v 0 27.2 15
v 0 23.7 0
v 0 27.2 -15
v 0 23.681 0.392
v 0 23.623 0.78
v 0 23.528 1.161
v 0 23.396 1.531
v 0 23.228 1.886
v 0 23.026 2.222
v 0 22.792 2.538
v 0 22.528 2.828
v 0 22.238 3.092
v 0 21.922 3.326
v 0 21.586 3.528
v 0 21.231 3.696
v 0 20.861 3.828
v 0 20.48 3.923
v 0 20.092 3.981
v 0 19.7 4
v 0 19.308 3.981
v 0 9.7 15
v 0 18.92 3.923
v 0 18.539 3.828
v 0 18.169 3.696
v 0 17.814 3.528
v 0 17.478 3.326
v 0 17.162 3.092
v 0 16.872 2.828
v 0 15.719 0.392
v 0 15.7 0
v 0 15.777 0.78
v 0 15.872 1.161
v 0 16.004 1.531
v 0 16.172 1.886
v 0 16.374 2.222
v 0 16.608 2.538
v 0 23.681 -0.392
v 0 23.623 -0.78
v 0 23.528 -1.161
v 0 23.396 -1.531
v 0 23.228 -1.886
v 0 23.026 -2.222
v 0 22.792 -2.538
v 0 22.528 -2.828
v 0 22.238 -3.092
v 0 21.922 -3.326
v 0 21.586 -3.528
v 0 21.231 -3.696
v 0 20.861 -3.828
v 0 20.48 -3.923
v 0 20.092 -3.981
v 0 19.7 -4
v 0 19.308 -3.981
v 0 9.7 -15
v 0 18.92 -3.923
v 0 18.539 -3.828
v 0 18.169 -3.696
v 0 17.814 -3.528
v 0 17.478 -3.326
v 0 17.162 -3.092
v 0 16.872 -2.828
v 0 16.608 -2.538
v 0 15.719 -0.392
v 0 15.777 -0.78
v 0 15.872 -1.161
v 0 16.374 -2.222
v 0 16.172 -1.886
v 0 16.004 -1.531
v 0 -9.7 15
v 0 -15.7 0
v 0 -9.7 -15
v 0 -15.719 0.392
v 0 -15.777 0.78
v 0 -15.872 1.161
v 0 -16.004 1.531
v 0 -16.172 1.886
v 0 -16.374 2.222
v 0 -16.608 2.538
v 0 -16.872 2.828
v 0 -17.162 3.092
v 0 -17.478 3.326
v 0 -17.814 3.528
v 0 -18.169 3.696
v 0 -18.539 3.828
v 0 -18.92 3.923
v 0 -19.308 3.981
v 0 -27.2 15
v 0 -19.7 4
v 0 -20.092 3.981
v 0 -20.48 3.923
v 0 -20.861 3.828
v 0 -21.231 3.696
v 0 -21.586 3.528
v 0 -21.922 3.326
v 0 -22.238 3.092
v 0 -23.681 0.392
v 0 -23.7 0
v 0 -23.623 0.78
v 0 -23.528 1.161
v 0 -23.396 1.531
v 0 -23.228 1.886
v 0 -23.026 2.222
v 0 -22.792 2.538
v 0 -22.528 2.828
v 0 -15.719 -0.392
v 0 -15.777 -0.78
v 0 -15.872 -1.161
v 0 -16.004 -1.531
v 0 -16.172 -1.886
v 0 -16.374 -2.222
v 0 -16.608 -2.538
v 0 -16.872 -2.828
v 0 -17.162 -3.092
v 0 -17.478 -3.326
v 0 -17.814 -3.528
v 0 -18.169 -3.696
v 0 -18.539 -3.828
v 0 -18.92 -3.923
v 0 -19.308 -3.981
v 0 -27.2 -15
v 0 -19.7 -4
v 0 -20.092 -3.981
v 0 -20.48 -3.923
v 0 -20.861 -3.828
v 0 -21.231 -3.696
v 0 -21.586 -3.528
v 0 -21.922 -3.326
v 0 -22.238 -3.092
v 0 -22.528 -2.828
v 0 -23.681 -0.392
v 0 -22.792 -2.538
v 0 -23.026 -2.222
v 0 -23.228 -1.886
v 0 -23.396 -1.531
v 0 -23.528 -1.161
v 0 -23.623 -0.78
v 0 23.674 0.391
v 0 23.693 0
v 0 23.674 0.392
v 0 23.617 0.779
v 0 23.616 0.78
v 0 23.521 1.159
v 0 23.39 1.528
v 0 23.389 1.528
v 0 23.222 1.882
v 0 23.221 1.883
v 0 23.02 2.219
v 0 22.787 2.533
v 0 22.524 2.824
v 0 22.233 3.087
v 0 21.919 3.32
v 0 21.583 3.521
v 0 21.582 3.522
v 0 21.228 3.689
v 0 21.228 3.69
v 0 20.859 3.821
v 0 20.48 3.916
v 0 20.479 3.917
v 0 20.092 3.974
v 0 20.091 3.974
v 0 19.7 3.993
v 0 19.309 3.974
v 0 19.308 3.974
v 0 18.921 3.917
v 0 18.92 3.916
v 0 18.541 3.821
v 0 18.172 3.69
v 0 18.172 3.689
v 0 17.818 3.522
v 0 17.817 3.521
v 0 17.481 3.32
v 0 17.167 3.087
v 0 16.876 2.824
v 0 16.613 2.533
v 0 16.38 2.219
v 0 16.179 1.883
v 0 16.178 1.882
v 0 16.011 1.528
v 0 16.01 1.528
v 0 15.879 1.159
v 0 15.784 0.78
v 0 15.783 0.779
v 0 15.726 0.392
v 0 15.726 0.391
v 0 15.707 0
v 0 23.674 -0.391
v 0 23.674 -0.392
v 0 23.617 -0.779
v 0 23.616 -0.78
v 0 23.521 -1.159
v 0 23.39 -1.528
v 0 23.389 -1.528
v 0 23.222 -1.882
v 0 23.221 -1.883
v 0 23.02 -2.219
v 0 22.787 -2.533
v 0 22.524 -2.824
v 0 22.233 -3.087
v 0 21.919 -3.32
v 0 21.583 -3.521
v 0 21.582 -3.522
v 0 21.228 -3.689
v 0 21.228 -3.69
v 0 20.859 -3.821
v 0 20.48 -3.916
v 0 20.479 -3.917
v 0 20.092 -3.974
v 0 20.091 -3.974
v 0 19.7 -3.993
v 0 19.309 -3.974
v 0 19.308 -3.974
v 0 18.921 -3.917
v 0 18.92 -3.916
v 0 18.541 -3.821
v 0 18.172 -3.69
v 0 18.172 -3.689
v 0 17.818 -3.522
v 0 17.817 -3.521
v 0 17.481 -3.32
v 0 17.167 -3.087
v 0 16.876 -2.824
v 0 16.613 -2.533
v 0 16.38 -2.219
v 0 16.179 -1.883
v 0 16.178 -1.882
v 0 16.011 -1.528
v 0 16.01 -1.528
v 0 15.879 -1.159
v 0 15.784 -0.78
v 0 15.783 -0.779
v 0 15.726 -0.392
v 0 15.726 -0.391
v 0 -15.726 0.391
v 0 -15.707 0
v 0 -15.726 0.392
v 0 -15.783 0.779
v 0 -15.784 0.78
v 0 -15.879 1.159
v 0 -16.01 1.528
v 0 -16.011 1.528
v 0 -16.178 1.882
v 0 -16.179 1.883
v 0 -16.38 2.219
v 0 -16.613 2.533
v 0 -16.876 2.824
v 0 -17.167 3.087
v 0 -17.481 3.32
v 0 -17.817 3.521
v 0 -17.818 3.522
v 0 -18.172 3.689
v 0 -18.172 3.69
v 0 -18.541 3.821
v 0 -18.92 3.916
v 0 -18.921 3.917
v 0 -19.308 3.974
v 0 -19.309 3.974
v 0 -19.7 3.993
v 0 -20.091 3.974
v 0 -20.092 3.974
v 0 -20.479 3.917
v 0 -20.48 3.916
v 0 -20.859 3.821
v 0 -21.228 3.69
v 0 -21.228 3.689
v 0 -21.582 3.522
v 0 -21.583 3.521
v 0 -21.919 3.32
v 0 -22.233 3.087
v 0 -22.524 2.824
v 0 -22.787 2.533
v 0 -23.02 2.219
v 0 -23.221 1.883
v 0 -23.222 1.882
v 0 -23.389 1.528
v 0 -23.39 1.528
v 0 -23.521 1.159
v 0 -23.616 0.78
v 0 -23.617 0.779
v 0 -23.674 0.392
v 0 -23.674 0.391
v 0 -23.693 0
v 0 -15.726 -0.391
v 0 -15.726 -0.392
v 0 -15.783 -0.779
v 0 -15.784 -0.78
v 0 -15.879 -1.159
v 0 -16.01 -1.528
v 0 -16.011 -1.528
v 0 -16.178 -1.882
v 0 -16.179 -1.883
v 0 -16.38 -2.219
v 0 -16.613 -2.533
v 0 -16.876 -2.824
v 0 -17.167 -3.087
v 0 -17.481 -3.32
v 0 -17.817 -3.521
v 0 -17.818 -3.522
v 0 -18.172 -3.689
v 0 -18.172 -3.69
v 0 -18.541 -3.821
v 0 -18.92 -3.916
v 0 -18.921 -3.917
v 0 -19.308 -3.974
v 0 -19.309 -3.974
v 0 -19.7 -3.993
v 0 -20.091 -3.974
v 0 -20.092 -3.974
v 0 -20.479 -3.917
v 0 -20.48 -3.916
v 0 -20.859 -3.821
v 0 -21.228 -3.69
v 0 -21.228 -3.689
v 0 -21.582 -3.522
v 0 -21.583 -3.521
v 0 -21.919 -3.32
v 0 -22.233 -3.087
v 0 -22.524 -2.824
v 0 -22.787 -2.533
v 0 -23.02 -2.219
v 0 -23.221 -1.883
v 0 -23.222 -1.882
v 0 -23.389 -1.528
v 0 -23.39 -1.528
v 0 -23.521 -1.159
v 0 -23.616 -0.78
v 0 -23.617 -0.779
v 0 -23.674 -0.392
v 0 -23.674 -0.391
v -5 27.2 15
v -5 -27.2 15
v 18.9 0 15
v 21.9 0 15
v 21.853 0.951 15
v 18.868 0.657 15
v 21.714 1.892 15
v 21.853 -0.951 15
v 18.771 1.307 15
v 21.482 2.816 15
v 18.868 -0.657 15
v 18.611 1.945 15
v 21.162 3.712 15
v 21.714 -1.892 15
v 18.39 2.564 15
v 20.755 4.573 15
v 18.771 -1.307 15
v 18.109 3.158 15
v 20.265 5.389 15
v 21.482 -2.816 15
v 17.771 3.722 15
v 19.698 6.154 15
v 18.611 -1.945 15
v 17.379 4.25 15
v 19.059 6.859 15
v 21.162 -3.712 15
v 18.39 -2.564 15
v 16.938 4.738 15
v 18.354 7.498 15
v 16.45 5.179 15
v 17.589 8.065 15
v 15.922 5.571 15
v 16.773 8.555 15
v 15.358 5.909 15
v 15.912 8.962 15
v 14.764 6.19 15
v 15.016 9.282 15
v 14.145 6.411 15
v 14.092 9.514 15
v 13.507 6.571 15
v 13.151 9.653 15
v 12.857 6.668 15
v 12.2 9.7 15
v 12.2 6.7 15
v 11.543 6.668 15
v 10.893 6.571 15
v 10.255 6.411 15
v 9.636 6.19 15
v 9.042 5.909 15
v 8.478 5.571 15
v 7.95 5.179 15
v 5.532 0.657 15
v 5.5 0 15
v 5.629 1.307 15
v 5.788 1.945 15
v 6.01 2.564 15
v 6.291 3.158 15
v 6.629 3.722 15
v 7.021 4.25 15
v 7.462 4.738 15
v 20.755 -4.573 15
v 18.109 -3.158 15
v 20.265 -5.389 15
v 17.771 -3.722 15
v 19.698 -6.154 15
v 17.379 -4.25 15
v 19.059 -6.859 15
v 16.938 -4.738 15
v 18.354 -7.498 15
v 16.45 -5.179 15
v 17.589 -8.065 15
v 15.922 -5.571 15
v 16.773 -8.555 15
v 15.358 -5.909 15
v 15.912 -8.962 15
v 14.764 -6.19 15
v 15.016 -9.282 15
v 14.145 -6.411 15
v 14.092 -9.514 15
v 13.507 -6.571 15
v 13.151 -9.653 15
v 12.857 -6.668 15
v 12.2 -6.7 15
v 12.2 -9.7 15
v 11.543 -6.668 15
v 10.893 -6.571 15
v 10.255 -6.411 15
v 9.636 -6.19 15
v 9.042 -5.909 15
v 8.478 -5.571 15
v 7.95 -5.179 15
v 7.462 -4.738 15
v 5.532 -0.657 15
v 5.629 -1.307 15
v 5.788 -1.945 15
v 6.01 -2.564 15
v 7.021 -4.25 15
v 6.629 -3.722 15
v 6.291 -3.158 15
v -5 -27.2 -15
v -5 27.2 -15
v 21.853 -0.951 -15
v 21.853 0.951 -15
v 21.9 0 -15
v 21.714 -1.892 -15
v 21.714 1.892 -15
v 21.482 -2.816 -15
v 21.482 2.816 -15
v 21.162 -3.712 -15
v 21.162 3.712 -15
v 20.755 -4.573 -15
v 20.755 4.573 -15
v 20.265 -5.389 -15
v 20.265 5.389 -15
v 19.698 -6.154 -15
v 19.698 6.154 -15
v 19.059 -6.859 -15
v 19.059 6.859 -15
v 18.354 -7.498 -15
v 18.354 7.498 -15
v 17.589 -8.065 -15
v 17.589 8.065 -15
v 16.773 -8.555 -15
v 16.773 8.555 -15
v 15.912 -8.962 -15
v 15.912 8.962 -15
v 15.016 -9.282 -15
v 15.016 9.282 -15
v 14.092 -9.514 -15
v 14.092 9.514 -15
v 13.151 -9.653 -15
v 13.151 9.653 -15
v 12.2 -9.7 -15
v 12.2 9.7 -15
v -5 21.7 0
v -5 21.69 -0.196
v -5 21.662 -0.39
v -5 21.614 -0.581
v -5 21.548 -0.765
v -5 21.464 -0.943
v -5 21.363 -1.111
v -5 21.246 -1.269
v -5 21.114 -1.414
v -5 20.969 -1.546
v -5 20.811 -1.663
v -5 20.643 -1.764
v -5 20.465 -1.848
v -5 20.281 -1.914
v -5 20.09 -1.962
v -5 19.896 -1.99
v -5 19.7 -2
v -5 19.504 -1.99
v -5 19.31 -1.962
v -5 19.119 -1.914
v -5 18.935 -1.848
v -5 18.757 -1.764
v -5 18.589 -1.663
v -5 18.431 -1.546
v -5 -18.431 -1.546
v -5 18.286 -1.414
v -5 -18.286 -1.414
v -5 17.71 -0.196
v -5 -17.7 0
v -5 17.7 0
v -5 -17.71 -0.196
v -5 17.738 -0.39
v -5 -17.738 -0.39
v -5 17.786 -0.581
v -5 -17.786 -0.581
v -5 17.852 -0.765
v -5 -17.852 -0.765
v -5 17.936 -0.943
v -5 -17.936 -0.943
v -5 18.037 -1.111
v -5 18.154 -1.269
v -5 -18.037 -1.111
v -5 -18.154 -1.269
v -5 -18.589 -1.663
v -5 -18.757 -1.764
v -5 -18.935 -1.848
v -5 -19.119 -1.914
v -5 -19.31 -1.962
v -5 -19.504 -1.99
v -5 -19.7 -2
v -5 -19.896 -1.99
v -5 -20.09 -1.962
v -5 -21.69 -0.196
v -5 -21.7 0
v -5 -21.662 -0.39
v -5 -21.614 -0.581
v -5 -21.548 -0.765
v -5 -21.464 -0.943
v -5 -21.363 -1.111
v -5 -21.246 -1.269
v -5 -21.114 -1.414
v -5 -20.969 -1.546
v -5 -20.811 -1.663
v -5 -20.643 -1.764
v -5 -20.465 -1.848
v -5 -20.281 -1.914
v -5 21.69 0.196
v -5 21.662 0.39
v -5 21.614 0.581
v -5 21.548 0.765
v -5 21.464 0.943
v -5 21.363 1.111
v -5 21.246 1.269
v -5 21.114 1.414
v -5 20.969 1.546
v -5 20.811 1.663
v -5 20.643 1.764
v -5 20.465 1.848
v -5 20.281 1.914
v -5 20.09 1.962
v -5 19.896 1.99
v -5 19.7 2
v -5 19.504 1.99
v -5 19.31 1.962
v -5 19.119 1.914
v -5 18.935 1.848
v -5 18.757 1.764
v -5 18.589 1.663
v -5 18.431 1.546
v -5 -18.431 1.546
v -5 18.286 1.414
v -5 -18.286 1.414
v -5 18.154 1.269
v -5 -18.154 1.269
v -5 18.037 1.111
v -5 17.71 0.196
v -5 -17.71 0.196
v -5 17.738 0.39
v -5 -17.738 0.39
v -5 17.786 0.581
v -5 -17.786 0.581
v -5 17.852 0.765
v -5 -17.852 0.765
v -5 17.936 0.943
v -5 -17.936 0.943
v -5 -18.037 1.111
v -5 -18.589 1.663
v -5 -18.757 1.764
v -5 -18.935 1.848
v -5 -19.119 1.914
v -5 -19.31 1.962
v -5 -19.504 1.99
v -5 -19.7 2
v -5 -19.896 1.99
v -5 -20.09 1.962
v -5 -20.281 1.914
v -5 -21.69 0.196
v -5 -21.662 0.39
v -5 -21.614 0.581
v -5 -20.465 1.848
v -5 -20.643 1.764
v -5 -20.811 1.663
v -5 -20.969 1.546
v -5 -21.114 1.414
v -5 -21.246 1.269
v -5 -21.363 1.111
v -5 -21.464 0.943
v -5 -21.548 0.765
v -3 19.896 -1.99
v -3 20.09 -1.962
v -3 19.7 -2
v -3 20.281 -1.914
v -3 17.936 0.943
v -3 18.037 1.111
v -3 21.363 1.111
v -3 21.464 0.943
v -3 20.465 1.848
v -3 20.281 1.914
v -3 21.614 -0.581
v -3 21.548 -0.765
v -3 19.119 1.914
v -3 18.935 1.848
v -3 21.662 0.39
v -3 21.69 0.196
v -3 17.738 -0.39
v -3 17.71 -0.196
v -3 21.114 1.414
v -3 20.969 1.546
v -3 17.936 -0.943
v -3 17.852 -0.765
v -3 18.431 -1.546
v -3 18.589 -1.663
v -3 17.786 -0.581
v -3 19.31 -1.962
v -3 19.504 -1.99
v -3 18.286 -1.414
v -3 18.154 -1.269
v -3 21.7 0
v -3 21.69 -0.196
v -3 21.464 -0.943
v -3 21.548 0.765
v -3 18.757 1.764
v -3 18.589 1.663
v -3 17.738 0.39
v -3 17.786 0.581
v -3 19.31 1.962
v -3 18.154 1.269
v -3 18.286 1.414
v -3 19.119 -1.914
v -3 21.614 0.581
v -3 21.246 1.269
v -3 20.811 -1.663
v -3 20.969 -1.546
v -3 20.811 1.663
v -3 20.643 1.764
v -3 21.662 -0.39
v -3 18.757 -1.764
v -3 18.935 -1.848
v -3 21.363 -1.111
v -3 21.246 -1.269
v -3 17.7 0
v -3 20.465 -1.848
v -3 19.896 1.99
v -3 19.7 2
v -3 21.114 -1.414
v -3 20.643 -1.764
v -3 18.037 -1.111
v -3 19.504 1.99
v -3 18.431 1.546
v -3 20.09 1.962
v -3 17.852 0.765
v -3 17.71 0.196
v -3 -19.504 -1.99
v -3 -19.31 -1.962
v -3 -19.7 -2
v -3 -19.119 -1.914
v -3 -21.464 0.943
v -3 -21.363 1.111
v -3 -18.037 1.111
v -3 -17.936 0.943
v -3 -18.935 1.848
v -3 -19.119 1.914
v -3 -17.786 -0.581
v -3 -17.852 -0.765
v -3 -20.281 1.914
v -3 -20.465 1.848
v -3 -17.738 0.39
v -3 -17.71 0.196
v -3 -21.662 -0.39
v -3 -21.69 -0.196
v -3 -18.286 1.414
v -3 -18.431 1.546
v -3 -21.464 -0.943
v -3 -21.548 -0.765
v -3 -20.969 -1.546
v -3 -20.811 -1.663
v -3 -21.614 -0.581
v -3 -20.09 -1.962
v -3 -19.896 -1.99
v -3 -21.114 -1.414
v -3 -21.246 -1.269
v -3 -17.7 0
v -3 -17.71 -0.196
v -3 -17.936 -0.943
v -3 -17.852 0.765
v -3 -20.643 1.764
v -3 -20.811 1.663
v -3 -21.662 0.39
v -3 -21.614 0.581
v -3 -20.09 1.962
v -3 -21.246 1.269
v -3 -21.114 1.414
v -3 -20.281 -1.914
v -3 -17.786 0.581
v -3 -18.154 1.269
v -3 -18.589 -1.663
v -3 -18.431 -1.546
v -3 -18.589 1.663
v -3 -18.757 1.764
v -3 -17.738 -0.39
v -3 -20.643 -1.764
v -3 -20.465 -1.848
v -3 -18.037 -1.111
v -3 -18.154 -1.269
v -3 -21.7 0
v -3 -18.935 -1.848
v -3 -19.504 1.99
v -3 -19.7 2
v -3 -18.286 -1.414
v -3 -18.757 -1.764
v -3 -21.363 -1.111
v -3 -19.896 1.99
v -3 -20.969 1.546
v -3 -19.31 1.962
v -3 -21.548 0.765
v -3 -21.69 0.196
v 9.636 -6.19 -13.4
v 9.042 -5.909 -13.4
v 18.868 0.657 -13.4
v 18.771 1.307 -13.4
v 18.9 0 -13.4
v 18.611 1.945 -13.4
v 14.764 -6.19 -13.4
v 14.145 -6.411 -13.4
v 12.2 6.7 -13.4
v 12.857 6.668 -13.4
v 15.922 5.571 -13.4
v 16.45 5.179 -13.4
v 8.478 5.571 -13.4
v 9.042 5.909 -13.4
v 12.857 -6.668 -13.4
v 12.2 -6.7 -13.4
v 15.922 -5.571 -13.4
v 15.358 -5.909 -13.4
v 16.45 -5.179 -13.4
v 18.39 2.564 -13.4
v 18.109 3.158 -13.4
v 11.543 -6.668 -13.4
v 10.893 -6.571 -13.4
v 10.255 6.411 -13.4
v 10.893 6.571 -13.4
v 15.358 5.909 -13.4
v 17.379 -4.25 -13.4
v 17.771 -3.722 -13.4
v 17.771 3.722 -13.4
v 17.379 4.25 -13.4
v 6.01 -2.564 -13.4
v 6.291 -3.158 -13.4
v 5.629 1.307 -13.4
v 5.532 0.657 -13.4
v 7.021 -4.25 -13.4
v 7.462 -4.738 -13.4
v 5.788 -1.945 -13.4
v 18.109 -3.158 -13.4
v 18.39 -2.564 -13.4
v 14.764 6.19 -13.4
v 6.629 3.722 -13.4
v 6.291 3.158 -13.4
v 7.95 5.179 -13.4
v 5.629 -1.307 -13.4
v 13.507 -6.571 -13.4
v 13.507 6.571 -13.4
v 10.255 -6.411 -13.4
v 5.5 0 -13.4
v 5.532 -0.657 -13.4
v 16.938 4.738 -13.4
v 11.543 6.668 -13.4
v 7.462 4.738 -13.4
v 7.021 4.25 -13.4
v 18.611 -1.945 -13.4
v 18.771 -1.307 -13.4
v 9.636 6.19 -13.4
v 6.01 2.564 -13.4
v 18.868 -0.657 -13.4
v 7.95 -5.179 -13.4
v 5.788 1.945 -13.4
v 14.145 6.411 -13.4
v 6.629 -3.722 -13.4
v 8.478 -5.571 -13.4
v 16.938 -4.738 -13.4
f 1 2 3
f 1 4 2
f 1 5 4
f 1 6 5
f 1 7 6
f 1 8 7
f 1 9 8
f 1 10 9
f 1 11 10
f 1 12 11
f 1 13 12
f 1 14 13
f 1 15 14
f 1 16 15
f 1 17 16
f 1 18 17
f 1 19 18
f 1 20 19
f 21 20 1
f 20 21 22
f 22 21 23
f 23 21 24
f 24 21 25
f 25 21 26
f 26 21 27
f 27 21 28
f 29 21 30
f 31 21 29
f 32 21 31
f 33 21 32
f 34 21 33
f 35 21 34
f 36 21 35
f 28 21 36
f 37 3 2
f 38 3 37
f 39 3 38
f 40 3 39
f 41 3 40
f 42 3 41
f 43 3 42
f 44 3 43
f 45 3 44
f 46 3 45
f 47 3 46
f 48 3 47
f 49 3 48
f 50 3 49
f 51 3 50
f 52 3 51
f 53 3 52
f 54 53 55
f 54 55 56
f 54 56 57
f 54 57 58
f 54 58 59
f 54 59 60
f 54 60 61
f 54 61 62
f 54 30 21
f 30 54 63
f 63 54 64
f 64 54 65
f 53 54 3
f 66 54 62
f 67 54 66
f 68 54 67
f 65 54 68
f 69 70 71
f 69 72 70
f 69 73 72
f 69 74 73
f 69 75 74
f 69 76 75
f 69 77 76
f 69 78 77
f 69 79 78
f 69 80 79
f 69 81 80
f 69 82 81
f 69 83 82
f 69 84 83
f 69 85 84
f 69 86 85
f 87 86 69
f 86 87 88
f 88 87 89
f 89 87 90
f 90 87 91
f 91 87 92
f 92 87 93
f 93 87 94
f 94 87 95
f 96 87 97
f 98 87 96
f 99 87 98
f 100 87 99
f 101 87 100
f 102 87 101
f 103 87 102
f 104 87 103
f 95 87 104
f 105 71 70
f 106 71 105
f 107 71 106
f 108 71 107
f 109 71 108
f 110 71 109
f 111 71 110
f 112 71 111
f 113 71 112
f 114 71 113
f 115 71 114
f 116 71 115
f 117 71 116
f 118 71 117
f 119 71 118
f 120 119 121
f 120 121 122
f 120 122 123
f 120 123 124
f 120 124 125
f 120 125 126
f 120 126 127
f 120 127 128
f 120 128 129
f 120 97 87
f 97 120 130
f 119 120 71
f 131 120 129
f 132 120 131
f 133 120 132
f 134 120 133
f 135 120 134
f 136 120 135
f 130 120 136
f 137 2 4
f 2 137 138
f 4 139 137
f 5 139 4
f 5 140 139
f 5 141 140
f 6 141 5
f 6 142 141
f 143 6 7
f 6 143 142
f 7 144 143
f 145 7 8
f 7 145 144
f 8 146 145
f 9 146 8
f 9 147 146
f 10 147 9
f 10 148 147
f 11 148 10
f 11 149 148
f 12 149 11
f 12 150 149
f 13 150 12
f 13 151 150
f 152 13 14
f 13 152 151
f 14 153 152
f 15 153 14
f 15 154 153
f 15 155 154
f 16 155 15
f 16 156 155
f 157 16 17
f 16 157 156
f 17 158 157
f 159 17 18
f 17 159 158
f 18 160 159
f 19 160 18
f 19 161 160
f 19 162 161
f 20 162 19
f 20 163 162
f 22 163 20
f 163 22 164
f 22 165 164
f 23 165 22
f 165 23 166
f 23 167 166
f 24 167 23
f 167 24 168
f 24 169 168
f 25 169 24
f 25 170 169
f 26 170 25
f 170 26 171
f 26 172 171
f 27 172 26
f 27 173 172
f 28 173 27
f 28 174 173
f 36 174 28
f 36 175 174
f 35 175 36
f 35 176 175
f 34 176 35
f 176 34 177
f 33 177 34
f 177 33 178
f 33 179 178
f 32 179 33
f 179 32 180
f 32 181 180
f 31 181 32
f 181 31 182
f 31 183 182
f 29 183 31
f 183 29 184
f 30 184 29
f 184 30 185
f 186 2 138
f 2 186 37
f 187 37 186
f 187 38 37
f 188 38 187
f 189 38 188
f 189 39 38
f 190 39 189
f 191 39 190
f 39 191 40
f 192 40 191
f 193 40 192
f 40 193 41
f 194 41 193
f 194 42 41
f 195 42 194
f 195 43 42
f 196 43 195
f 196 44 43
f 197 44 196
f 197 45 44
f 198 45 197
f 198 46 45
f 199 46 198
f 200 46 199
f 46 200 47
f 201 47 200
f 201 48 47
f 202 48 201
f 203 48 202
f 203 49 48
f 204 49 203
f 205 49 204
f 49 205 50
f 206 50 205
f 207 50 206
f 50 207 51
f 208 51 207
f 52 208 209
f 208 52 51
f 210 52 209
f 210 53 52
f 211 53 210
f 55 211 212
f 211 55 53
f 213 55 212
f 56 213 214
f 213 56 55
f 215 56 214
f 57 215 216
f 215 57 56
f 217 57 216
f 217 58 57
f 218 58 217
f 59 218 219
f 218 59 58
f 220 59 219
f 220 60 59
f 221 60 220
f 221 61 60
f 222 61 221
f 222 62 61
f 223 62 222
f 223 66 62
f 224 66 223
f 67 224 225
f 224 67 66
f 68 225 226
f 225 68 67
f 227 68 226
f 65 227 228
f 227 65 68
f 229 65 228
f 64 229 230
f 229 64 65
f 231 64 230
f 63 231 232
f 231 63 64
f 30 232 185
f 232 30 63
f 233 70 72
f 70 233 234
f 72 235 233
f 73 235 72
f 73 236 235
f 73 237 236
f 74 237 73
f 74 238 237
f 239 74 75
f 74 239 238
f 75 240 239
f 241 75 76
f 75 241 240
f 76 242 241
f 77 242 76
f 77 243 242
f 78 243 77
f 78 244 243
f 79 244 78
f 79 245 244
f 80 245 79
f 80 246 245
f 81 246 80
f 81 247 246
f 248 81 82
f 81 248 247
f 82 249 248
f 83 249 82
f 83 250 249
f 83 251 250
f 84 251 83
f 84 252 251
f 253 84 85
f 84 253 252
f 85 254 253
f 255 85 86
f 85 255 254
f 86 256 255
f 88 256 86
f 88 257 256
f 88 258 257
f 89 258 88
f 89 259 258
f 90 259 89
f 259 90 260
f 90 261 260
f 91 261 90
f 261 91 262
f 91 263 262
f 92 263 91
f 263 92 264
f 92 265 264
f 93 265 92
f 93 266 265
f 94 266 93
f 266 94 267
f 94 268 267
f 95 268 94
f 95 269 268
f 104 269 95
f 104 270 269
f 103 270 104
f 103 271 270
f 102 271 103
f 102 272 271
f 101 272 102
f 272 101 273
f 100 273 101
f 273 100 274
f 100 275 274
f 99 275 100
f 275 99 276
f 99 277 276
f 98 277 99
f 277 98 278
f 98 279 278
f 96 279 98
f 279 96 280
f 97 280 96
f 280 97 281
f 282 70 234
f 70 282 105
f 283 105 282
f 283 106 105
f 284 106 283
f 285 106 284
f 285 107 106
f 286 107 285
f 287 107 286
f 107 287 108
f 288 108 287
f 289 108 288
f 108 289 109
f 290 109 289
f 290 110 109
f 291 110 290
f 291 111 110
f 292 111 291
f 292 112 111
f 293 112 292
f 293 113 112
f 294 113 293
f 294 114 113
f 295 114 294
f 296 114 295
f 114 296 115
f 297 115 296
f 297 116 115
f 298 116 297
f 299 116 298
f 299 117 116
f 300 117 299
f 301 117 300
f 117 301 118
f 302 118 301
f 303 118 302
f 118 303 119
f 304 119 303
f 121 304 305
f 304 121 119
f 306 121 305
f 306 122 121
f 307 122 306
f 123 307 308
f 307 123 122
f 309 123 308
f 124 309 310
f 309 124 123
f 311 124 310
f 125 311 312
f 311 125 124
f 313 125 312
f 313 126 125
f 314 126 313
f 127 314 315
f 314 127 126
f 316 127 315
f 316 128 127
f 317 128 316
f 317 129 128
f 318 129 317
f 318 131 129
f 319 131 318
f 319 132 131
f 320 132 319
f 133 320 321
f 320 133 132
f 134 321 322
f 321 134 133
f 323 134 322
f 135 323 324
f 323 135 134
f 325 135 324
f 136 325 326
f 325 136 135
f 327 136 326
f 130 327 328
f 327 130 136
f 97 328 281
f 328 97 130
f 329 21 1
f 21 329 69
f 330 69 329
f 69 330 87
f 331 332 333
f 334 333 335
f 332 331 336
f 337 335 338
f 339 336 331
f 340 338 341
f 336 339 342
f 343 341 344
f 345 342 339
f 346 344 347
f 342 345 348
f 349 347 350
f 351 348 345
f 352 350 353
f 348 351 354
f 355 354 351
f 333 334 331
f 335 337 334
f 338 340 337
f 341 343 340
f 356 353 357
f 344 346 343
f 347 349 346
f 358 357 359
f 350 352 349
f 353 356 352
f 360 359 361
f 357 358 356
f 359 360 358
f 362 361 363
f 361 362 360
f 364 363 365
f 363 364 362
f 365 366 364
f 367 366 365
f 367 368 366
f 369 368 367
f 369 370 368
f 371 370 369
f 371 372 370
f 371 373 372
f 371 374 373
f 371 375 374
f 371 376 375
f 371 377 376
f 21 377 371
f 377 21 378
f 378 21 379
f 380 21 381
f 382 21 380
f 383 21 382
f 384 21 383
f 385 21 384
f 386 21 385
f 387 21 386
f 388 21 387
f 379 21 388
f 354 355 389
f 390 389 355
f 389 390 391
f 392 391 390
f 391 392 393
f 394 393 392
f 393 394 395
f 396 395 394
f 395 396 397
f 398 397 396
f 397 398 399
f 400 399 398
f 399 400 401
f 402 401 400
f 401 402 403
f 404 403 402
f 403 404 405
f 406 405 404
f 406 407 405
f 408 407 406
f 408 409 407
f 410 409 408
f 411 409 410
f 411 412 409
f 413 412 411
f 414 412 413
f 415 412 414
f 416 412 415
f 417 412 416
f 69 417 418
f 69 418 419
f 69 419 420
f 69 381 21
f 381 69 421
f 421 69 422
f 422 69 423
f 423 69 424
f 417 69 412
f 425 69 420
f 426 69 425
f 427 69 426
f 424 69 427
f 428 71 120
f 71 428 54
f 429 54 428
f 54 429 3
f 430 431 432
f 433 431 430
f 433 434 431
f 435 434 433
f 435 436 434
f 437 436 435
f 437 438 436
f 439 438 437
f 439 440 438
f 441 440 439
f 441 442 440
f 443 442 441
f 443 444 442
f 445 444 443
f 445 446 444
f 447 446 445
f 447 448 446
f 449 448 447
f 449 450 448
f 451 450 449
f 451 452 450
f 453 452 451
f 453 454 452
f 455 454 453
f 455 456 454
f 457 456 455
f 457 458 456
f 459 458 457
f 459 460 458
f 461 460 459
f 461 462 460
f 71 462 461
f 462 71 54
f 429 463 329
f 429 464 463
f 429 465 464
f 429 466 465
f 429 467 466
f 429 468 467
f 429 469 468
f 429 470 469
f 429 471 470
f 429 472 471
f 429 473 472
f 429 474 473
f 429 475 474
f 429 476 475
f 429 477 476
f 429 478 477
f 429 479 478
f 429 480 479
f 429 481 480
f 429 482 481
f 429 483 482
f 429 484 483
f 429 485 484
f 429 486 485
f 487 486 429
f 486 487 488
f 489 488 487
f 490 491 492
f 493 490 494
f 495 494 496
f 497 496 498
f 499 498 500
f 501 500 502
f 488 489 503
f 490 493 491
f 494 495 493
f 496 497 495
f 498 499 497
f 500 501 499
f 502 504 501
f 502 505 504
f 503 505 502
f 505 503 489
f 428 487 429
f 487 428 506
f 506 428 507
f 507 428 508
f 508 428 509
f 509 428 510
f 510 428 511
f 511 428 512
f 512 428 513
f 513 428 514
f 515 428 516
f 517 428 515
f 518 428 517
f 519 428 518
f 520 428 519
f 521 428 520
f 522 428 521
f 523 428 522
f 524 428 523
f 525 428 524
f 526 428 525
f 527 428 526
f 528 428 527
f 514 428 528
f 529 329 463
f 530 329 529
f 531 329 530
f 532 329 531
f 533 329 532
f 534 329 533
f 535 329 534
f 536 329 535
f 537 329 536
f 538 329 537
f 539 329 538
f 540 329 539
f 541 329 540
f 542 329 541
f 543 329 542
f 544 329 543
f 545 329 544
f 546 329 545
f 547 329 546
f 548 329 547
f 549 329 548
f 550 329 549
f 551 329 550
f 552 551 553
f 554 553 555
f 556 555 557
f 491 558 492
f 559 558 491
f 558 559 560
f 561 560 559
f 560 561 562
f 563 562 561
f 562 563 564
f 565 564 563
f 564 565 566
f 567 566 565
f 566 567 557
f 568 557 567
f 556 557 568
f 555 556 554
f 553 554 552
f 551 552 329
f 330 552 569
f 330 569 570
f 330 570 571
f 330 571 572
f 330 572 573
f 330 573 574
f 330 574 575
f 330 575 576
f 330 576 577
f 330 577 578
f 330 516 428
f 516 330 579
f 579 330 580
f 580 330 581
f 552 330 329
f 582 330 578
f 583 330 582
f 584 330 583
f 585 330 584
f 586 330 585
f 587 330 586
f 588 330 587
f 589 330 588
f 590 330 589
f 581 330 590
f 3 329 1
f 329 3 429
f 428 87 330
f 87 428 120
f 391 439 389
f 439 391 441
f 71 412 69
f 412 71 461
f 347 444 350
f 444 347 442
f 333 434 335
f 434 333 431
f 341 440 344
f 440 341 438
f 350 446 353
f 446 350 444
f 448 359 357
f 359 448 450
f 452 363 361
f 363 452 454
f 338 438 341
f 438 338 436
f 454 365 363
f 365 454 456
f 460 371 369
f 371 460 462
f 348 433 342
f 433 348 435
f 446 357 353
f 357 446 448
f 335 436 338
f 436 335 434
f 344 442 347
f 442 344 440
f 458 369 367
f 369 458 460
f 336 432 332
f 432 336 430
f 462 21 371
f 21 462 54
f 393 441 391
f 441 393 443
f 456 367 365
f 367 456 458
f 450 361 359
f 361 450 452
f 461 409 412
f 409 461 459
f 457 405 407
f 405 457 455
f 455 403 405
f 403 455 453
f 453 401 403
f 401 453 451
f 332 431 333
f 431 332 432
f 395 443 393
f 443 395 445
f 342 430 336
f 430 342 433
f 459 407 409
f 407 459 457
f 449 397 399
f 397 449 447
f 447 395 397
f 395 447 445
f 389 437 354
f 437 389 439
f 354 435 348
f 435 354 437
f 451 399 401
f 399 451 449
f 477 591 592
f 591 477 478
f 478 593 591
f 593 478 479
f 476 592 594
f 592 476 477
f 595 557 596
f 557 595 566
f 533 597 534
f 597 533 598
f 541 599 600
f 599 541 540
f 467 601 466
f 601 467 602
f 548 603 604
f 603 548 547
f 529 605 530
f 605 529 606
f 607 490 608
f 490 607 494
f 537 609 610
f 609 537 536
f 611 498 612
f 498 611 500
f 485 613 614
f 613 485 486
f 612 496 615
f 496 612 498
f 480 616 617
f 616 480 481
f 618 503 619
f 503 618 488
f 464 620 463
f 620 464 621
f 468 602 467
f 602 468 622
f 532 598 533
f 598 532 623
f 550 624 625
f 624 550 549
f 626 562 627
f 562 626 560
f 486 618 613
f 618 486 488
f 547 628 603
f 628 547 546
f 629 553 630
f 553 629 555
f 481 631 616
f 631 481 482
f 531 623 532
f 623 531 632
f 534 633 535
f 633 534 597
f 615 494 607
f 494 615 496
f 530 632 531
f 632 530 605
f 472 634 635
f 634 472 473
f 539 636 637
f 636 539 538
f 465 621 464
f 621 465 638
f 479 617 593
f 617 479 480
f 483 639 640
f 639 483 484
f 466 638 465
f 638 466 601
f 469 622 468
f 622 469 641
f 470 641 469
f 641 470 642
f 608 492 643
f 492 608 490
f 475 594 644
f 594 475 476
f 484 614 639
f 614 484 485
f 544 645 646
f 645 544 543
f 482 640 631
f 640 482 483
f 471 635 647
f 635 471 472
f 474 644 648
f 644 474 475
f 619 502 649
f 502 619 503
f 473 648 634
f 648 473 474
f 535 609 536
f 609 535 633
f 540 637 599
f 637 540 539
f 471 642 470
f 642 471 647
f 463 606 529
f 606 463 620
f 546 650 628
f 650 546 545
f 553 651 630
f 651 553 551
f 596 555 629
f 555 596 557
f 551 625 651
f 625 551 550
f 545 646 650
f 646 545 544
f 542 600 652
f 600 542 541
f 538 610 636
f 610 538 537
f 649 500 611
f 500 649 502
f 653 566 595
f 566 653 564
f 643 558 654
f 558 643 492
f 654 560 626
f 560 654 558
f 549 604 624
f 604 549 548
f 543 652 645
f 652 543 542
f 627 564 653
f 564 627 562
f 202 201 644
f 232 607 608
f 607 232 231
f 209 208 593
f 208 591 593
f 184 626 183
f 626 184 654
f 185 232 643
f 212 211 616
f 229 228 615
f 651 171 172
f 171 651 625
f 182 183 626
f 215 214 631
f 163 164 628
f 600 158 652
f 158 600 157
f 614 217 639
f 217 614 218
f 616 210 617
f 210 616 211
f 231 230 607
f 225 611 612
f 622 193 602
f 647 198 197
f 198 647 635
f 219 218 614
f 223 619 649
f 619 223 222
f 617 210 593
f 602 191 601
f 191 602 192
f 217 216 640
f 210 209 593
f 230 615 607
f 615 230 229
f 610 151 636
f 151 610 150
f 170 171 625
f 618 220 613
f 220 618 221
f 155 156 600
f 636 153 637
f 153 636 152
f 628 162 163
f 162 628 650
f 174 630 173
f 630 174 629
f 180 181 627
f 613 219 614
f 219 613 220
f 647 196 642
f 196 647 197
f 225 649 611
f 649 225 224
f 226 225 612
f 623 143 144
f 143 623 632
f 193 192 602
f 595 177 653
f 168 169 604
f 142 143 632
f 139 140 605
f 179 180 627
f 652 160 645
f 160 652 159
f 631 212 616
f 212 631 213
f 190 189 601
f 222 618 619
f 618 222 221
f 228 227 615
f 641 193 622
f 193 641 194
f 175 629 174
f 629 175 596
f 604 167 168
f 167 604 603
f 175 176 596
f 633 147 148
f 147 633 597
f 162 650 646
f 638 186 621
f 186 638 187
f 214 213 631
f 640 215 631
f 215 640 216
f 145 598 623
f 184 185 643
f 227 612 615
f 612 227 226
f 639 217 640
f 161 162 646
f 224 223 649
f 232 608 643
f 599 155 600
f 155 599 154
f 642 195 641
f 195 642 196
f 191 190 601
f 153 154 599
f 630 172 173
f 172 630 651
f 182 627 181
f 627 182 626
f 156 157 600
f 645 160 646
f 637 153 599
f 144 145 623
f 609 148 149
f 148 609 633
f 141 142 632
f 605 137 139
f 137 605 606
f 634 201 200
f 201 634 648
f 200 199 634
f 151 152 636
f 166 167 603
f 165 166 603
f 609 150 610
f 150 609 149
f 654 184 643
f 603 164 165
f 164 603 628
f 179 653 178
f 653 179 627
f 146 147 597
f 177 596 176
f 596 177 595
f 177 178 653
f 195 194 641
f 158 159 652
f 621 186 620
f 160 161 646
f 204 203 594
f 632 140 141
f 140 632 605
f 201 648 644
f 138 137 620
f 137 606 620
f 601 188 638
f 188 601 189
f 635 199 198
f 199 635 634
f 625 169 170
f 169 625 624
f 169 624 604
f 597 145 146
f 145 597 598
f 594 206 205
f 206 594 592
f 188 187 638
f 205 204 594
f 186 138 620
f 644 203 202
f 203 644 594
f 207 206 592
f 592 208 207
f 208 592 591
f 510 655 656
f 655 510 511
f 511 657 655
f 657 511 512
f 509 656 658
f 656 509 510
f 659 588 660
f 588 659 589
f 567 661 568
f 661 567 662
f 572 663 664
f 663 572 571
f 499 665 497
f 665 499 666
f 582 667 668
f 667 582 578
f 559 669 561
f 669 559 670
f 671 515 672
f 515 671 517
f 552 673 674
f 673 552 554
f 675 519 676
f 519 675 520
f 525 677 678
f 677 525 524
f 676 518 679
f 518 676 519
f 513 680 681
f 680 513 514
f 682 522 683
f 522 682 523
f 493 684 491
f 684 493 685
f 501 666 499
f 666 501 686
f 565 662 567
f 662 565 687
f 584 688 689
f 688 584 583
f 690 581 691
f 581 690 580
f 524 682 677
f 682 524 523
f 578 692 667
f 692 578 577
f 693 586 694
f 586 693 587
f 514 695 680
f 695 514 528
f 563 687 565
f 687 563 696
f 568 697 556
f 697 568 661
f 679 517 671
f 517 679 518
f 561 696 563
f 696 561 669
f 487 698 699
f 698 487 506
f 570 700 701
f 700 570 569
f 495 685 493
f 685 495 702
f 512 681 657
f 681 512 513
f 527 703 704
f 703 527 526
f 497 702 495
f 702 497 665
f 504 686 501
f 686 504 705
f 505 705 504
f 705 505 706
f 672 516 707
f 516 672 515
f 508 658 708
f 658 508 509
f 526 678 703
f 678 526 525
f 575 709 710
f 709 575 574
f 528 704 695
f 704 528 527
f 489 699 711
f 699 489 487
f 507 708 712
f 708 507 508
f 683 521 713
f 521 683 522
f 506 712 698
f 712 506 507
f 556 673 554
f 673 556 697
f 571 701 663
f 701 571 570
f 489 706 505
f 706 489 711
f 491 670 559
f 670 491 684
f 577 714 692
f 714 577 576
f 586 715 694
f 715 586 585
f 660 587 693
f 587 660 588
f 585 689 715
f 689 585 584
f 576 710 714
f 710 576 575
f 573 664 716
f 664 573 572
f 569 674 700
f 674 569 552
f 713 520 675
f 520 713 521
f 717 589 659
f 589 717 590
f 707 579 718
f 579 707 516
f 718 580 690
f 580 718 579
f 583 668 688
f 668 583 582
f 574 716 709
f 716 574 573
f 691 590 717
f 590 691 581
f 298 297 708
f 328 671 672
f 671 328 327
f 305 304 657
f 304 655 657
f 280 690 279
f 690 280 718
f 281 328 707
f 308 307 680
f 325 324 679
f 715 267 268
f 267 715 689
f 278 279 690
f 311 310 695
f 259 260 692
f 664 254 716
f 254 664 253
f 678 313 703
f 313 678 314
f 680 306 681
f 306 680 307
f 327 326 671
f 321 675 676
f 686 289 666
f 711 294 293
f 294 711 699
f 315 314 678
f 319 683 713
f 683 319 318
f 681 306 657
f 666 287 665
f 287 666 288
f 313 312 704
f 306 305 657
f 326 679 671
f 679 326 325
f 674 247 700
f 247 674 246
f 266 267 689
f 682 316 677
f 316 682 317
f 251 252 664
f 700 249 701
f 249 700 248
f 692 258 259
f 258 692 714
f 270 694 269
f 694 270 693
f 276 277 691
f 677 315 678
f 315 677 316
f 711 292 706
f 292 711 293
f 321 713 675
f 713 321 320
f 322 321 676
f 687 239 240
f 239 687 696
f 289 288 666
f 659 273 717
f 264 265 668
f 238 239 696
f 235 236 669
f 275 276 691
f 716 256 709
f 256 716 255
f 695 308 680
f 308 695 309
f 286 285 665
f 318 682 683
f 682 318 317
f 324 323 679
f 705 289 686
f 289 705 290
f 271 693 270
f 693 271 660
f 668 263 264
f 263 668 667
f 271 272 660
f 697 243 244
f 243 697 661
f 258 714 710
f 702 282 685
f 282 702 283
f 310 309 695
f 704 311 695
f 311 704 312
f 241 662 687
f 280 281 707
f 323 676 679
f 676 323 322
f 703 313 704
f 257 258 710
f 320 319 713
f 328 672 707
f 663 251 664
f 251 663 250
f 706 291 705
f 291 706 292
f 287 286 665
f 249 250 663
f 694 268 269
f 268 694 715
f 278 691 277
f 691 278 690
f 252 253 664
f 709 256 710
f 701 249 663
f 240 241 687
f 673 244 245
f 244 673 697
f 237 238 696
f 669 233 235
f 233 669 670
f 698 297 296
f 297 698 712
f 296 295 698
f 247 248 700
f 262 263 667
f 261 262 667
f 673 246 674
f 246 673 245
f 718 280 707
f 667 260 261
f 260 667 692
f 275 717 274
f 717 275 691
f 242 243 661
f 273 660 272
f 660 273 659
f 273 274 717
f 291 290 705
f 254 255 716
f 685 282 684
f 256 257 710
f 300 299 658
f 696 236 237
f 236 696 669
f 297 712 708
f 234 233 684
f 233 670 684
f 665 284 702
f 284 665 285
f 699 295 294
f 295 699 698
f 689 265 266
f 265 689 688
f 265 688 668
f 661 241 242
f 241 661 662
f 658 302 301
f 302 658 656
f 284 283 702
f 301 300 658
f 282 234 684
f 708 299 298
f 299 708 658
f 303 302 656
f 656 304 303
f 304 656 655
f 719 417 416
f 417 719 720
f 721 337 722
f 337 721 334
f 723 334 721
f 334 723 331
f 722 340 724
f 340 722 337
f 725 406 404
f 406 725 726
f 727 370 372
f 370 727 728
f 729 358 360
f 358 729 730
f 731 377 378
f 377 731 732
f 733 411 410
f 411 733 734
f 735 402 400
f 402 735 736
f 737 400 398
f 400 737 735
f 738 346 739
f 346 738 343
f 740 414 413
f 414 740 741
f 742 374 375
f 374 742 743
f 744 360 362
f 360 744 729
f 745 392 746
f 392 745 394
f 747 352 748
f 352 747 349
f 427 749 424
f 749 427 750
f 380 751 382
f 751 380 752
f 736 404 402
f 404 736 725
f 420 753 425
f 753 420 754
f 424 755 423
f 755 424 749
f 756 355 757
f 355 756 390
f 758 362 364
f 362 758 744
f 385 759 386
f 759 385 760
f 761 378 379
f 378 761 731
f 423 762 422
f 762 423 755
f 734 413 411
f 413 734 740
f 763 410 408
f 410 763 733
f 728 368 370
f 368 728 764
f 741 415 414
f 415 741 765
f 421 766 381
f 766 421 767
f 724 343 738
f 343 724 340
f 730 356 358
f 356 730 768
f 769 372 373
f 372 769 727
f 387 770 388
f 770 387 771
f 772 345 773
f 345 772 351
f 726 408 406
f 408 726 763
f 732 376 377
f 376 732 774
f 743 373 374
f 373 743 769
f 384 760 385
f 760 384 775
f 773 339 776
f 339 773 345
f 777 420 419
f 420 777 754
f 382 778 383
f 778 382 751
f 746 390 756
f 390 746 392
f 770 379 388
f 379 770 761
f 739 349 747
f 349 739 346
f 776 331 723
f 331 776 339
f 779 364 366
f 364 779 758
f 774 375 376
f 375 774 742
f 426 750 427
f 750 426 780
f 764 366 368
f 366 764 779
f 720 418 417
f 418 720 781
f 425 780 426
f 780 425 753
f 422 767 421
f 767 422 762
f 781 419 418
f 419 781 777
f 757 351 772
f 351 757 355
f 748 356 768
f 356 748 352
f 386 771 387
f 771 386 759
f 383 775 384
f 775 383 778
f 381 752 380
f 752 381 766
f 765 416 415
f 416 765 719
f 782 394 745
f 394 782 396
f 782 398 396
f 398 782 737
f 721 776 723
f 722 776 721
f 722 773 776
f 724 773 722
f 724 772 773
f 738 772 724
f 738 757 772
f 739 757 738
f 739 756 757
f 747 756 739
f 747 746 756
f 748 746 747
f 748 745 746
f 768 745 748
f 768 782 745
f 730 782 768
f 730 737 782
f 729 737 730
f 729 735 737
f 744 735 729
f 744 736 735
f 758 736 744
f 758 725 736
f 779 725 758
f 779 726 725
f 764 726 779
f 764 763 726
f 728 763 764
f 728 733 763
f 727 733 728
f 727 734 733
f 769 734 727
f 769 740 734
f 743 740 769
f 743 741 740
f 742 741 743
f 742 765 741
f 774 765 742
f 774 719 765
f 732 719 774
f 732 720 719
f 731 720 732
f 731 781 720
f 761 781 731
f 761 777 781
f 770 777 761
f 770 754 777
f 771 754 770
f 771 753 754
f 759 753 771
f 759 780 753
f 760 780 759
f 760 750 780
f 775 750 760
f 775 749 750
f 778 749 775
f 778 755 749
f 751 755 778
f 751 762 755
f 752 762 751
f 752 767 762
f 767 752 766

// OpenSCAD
// Light Stand Wall Mount
//
// Description:
// A wall mount bracket designed to hold a light stand pole (12mm diameter).
// It attaches to a wooden pillar using wood screws.

$fn = 64;

// --- Parameters ---

// Pole Dimensions
pole_diameter = 12.0;
pole_insert_depth = 30.0;
pole_clearance = 1.4; // Increased from 0.4 to compensate for 3D printer shrinkage (~1mm observed)

// Holder Dimensions
holder_wall_thickness = 3.0;
holder_od = pole_diameter + pole_clearance + (holder_wall_thickness * 2);

// Wall Mount Base Dimensions
base_thickness = 5.0;
// Base height is primarily determined by the pole insert depth
base_height = pole_insert_depth; 

// Screw Position Parameters
screw_hole_spacing = holder_od + 20.0; // Distance between screw hole centers
base_width = screw_hole_spacing + 15.0; // Total width to accommodate screws

// Mounting Screw Parameters (Countersunk Wood Screw)
screw_hole_diameter = 4.0;       // Shank diameter
screw_head_diameter = 8.0;       // Head diameter
screw_head_countersink_depth = 3.0; 

// --- Modules ---

module screw_hole_countersunk() {
  rotate([0, 90, 0]) {
    // Shank hole
    cylinder(d = screw_hole_diameter, h = base_thickness * 3, center = true);
    
    // Countersink head (positioned to be flush with surface)
    // The surface is at global X=0.
    // Inside rotate([0,90,0]), global X corresponds to local Z.
    // We want the wide part (d2) at Z=0, and narrow part (d1) at Z = -screw_head_countersink_depth.
    translate([0, 0, -screw_head_countersink_depth])
      cylinder(d1 = screw_hole_diameter, d2 = screw_head_diameter, h = screw_head_countersink_depth + 0.01);
      
    // Head clearance (cylindrical cutout for the head itself entering from outside)
    // From Z=0 outwards to +Z
    translate([0, 0, 0])
      cylinder(d = screw_head_diameter, h = 10);
  }
}

module light_stand_holder() {
  difference() {
    union() {
      // 1. Base Plate Body (Wider now)
      translate([-base_thickness/2, 0, 0])
        cube([base_thickness, base_width, base_height], center = true);

      // 2. Connector (Hull) between Base and Holder
      // We hull the cylinder with a thin slice of the base plate to create a strong joint
      hull() {
        // Slice of base plate (central part only)
        translate([-base_thickness/2 + 0.1, 0, 0])
           cube([0.1, holder_od, base_height], center = true);
        
        // The Holder Cylinder Outer Shell
        translate([holder_od/2 + base_thickness/2, 0, 0])
           cylinder(d = holder_od, h = base_height, center = true);
      }
    }

    // --- Subtractions ---

    // 1. Pole Hole (Blind hole, solid bottom)
    // Positioned so the top is open.
    // Cylinder is centered in Z (range -base_height/2 to +base_height/2)
    // We want the hole to start at top (+base_height/2) and go down 'pole_insert_depth'
    
    translate([holder_od/2 + base_thickness/2, 0, base_height/2 - pole_insert_depth/2 + 0.1])
      // slightly strictly speaking, if base_height == insert_depth, it goes all the way through minus bottom if we adjust.
      // Current base_height = 30, depth = 30. It will be open at bottom.
      // Let's add a floor.
      // To have a floor, the base_height should be slightly larger than insert depth, OR we shift the hole up.
      // Let's make the hole NOT go all the way through designated depth, but stopped by variable.
      // Actually, let's allow it to be through-hole if height matches, but user wants to "rest" it.
      // Let's add a solid bottom cap to the geometry, or just don't drill all the way.
      // Let's shift the hole up so it leaves 2mm at bottom.
      translate([0, 0, 2]) 
        cylinder(d = pole_diameter + pole_clearance, h = pole_insert_depth + 1, center = true);

    // 2. Screw Holes (Left and Right)
    // Located at Y = +/- screw_hole_spacing/2
    translate([0, screw_hole_spacing/2, 0])
      screw_hole_countersunk();
      
    translate([0, -screw_hole_spacing/2, 0])
      screw_hole_countersunk();
  }
}

// Render the part
light_stand_holder();
